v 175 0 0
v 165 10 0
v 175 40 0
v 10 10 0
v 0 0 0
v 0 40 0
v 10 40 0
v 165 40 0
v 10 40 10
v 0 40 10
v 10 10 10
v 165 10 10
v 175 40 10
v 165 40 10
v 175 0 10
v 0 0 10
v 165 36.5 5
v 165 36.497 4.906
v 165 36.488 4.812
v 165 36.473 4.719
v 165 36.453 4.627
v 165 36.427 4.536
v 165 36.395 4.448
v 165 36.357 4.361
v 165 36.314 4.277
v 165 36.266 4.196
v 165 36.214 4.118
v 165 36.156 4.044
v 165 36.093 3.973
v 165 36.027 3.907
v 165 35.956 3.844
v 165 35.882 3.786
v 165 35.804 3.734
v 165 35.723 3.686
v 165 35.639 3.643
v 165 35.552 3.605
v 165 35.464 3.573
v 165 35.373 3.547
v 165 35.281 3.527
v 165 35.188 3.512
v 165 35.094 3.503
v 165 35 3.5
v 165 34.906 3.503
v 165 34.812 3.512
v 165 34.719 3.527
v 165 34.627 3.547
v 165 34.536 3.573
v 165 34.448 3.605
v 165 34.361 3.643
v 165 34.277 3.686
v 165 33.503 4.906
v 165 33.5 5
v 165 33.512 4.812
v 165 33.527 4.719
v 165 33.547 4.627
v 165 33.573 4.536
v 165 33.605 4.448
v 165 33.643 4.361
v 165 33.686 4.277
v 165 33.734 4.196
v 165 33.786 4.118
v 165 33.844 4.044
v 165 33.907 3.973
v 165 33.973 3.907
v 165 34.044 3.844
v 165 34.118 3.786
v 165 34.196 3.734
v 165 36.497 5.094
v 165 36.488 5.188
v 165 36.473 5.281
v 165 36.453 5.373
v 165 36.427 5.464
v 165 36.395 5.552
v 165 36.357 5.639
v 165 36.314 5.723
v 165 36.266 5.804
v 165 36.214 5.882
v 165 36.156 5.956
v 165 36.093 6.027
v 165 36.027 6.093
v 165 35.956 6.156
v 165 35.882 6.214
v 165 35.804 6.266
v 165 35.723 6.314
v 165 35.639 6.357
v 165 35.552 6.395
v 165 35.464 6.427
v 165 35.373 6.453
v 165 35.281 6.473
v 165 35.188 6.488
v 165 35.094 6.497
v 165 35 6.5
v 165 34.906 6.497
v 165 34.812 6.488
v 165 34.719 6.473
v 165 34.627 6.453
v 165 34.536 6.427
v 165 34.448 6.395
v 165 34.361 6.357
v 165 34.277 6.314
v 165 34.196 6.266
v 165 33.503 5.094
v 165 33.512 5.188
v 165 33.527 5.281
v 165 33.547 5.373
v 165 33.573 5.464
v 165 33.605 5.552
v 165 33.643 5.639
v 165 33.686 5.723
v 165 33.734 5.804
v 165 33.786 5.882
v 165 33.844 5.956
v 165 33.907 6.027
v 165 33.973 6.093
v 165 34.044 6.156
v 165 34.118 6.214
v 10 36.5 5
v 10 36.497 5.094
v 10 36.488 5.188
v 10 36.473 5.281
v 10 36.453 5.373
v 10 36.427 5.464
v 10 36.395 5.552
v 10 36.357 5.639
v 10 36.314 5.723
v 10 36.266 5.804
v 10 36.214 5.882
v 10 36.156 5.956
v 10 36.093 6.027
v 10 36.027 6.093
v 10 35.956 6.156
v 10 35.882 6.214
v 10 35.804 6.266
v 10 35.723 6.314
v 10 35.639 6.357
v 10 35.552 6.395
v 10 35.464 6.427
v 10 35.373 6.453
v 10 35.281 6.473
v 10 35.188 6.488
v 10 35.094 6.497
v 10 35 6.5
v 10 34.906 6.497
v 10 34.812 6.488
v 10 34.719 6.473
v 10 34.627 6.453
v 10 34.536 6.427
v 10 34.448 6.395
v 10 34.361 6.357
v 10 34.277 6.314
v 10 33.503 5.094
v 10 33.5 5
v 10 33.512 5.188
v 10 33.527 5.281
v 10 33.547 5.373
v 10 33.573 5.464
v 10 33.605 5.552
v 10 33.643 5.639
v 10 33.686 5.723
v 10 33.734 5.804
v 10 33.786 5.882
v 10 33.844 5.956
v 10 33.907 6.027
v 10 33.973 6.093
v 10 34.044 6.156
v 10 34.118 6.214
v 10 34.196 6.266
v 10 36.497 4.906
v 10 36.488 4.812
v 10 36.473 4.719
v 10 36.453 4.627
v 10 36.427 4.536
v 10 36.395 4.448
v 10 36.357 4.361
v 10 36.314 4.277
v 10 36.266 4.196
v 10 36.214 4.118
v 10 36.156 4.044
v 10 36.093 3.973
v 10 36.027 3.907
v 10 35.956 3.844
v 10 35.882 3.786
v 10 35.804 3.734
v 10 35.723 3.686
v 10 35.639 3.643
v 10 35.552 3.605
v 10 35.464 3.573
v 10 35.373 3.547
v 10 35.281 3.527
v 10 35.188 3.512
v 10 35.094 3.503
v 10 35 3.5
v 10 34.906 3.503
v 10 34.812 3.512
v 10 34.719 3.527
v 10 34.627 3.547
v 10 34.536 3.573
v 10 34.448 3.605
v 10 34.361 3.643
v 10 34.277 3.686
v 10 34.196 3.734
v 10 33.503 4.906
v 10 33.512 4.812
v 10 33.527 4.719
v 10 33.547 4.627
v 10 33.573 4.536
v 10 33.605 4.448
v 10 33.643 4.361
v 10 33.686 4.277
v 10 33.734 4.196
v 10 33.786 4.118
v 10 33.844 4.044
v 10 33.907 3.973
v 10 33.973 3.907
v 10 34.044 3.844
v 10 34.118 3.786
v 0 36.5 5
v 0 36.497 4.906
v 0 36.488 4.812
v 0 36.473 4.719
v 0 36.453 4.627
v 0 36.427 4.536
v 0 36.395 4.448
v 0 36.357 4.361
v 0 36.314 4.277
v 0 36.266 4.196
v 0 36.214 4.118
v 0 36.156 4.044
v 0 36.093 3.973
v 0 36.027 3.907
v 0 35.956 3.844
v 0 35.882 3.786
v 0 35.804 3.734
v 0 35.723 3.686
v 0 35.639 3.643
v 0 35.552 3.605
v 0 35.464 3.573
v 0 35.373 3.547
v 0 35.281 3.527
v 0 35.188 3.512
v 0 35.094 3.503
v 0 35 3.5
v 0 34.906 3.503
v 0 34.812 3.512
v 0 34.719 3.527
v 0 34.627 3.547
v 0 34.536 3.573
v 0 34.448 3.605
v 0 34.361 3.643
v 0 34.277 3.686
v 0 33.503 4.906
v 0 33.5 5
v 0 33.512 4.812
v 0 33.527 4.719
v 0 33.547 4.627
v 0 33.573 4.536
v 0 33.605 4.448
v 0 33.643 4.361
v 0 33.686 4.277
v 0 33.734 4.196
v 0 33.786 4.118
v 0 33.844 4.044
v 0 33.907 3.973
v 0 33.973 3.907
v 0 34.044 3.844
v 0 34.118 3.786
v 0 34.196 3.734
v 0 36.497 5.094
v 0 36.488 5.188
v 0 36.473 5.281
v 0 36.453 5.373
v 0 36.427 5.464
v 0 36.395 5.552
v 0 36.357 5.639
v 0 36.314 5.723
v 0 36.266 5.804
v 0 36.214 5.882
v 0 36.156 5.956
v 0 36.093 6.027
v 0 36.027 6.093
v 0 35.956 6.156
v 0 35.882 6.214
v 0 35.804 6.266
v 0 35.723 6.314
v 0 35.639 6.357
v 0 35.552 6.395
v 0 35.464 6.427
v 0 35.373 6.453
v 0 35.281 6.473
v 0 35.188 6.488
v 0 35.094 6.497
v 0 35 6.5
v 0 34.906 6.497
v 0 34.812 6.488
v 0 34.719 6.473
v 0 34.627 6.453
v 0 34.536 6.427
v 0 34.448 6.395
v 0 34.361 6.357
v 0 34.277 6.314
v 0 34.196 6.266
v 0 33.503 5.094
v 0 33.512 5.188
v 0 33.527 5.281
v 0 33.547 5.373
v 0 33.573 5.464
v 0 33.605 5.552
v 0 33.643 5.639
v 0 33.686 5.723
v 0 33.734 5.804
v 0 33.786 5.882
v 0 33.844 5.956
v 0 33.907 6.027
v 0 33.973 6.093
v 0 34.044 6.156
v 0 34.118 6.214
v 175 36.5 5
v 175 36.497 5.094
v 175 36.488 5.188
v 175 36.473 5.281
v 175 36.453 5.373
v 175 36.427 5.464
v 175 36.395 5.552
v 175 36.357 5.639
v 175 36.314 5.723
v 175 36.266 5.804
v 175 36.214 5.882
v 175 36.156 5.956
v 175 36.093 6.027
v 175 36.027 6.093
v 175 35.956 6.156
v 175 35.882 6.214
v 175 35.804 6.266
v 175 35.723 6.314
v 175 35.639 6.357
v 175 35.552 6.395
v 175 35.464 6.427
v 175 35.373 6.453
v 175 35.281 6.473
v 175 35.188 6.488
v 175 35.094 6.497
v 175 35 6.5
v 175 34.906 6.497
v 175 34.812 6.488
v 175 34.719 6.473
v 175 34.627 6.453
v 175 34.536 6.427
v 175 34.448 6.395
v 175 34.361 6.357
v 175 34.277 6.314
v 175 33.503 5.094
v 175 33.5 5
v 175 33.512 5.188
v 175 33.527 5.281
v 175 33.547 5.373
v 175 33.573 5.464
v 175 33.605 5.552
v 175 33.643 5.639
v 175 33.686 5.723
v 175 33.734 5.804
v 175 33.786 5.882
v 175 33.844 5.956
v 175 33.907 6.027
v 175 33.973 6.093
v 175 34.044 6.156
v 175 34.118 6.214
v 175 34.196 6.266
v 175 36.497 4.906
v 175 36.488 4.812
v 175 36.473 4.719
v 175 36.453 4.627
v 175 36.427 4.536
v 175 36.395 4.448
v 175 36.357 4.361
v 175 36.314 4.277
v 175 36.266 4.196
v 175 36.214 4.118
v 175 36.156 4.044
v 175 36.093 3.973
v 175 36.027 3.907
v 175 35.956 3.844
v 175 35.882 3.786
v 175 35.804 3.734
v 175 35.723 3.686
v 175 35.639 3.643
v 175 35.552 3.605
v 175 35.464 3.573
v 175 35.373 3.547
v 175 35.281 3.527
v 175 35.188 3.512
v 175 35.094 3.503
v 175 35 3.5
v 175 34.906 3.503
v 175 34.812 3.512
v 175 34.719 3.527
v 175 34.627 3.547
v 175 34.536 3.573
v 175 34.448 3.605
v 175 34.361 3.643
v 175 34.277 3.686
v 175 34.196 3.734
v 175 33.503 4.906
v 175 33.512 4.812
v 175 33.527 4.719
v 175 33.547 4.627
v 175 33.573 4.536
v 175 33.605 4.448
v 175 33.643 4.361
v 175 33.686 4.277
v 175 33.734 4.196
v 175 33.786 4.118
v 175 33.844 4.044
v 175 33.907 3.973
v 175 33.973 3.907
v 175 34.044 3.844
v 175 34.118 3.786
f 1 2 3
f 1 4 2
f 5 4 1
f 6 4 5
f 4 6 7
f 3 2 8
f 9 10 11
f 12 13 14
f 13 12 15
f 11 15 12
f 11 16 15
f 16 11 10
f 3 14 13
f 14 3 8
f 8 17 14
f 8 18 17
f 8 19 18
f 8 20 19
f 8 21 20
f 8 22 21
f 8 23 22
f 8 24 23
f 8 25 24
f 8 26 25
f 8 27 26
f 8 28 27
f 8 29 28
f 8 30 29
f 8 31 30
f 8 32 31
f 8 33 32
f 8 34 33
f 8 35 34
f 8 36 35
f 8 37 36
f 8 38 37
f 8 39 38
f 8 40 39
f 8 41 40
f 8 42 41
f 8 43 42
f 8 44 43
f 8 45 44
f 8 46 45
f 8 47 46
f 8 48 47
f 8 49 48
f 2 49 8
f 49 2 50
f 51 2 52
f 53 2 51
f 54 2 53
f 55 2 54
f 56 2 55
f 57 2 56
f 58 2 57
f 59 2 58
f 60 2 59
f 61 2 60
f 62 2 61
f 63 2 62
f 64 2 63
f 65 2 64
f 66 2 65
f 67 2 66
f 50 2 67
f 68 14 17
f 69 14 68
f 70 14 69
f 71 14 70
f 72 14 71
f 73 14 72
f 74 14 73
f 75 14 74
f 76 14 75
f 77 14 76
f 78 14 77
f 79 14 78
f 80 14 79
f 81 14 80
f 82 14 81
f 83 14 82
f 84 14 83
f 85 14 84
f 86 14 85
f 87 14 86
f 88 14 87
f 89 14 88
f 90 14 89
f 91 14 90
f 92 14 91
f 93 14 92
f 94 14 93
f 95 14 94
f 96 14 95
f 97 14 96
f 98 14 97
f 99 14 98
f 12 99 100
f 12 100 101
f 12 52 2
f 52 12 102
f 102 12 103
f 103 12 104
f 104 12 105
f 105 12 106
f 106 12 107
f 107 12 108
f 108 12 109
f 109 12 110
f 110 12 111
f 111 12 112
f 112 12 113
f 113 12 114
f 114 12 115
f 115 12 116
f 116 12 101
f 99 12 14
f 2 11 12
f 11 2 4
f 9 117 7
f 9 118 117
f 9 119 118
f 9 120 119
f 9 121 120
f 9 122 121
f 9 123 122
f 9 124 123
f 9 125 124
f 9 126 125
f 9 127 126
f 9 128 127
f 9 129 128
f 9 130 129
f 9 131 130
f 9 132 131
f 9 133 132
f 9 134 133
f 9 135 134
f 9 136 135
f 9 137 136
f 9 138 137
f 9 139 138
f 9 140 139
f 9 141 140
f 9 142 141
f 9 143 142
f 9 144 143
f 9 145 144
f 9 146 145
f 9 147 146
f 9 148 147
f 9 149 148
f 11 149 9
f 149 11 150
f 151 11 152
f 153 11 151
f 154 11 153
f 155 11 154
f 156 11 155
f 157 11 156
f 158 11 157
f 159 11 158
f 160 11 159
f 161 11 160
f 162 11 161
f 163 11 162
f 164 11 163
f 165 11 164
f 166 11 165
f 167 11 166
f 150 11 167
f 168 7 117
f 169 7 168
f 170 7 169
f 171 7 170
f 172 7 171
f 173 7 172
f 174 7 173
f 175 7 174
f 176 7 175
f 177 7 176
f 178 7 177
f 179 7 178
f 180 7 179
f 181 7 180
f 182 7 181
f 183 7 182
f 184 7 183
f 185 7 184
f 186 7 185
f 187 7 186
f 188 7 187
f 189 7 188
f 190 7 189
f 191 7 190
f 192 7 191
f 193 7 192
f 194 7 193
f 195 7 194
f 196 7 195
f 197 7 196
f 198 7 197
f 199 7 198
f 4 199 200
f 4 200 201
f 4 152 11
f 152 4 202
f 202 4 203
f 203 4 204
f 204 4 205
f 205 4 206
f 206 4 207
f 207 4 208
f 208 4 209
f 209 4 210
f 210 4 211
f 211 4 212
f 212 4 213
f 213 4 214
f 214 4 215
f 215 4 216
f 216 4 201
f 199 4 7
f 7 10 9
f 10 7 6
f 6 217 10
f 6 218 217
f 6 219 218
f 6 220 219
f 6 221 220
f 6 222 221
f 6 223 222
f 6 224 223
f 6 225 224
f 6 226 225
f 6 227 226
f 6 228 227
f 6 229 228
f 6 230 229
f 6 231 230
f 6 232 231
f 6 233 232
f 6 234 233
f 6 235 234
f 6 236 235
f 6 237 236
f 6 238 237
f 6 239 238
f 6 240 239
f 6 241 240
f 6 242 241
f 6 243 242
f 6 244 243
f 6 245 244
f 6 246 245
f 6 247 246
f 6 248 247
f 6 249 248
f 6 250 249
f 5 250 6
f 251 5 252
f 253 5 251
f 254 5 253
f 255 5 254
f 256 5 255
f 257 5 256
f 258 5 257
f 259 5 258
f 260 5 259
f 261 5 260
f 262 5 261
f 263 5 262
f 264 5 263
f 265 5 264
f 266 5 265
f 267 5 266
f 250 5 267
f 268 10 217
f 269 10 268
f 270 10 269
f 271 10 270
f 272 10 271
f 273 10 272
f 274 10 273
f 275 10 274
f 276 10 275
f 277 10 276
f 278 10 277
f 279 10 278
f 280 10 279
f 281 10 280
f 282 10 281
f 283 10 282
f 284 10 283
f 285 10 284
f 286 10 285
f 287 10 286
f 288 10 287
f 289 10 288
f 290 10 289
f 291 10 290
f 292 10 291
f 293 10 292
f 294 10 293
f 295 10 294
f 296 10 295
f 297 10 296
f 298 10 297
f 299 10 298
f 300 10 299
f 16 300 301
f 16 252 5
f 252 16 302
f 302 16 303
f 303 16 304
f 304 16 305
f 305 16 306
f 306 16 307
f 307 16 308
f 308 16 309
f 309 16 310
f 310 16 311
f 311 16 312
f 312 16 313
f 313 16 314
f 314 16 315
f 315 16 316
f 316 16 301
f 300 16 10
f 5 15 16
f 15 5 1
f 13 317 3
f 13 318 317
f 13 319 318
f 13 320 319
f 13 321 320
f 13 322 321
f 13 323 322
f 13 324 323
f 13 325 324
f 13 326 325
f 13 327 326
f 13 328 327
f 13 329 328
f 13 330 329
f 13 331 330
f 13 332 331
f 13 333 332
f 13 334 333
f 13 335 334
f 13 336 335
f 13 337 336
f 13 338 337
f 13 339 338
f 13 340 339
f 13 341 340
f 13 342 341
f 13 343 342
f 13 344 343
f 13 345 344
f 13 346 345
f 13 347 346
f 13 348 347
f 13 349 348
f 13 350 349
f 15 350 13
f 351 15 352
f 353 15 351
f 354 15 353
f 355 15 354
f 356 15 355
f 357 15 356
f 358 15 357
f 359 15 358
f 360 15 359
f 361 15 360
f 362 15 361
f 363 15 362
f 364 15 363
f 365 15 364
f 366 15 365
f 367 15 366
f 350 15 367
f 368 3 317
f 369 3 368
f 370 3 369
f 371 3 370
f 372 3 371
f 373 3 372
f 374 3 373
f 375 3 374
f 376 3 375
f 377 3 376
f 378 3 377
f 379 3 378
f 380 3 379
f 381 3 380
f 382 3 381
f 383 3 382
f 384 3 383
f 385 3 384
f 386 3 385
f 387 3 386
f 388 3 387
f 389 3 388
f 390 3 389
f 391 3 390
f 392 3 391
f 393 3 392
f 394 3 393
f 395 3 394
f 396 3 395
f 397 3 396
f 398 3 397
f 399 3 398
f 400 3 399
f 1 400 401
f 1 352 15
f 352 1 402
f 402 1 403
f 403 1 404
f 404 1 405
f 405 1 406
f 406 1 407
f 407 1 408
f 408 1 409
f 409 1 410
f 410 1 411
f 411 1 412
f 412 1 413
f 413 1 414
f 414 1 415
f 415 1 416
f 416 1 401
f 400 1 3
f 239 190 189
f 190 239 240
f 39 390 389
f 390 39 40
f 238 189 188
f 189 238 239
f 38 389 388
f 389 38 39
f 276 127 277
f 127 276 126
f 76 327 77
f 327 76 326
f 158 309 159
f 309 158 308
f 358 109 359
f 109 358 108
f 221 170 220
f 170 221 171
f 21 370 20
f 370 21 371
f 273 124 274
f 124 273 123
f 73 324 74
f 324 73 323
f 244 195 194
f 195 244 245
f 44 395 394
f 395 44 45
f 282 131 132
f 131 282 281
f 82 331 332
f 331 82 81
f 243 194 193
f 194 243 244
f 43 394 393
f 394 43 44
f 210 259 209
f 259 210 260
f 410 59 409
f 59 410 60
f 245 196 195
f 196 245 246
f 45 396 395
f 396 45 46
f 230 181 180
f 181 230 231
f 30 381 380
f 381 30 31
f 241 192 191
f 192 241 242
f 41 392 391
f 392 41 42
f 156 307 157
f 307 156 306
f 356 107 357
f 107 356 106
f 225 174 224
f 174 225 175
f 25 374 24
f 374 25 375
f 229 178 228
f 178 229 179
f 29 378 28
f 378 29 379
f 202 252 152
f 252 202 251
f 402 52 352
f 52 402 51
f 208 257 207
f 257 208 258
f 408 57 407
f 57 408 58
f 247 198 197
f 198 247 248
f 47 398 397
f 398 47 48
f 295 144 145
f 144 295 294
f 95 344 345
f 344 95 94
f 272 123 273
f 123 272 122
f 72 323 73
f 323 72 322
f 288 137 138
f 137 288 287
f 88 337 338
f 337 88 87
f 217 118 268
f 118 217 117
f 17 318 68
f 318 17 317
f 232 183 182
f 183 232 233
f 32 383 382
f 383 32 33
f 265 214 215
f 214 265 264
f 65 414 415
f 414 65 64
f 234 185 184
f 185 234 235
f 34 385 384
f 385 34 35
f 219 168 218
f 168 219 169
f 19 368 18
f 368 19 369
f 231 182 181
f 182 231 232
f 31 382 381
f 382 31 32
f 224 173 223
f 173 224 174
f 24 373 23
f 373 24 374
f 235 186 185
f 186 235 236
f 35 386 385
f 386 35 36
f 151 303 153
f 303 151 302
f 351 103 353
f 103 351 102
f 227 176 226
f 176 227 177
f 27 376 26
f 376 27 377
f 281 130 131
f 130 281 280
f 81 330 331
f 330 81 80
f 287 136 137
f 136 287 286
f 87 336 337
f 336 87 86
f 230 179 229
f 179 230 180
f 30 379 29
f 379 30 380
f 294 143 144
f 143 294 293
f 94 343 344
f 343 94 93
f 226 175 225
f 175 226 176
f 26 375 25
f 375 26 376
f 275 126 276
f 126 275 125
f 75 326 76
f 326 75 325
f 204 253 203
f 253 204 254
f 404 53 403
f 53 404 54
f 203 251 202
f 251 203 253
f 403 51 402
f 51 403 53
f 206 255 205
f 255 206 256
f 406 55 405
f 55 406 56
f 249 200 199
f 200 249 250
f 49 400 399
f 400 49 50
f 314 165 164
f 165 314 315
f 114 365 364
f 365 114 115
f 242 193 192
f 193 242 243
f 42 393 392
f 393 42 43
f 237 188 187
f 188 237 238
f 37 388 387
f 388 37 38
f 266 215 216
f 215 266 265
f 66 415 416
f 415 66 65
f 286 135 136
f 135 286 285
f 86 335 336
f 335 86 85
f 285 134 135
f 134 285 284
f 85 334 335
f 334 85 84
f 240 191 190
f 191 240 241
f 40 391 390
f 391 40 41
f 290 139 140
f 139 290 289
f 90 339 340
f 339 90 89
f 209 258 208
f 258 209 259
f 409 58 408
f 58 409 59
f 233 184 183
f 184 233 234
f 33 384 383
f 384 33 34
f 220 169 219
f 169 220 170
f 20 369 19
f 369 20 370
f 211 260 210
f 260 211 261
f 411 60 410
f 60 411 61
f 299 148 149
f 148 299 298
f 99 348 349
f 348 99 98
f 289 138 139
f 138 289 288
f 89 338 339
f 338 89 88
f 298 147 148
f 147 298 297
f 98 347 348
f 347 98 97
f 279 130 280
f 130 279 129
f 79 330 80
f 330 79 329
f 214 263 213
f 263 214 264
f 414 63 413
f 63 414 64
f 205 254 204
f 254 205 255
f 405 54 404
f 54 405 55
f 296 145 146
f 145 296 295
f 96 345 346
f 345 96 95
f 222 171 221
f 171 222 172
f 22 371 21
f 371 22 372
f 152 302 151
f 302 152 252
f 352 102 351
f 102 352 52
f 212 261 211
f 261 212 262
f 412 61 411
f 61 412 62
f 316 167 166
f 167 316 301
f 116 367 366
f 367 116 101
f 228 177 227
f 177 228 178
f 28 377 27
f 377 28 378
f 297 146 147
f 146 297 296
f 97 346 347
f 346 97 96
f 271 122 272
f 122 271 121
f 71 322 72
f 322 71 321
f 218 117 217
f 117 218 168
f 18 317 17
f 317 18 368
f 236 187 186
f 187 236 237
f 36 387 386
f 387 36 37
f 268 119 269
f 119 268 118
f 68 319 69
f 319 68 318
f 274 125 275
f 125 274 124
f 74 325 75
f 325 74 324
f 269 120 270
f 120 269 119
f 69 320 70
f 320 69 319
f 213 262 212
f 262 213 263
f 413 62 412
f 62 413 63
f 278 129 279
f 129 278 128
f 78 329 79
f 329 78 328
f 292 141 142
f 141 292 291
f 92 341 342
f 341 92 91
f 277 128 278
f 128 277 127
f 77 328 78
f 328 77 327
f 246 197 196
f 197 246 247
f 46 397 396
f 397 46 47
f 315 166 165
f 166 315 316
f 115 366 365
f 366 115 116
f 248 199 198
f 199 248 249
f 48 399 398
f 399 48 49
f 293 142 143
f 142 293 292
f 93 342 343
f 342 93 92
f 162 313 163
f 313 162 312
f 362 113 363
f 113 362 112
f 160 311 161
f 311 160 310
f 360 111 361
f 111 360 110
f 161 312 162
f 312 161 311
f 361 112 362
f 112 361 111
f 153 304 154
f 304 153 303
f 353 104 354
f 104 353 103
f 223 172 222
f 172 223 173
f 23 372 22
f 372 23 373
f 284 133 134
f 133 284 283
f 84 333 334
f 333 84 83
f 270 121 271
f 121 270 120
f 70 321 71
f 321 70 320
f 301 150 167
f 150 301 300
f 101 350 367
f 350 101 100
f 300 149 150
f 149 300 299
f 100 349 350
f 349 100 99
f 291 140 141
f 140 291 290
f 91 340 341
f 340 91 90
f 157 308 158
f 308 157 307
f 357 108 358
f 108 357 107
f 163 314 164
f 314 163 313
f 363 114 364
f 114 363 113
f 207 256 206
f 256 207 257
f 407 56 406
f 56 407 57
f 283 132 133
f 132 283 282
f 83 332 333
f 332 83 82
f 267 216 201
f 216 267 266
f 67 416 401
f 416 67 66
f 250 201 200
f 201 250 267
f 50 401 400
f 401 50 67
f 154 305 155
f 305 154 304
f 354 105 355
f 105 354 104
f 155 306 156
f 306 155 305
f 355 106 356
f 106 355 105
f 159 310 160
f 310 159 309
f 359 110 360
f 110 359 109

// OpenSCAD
$fn=100;

width = 155;

difference() {
    linear_extrude(height=10, convexity=10) {
        difference() {
            square([width+20,40]);
            translate([10,10,0]) square([width,40]);
        }
    }

    translate([-5,35,5]) rotate([0,90,0]) cylinder(h=width+30, d=3);
}
